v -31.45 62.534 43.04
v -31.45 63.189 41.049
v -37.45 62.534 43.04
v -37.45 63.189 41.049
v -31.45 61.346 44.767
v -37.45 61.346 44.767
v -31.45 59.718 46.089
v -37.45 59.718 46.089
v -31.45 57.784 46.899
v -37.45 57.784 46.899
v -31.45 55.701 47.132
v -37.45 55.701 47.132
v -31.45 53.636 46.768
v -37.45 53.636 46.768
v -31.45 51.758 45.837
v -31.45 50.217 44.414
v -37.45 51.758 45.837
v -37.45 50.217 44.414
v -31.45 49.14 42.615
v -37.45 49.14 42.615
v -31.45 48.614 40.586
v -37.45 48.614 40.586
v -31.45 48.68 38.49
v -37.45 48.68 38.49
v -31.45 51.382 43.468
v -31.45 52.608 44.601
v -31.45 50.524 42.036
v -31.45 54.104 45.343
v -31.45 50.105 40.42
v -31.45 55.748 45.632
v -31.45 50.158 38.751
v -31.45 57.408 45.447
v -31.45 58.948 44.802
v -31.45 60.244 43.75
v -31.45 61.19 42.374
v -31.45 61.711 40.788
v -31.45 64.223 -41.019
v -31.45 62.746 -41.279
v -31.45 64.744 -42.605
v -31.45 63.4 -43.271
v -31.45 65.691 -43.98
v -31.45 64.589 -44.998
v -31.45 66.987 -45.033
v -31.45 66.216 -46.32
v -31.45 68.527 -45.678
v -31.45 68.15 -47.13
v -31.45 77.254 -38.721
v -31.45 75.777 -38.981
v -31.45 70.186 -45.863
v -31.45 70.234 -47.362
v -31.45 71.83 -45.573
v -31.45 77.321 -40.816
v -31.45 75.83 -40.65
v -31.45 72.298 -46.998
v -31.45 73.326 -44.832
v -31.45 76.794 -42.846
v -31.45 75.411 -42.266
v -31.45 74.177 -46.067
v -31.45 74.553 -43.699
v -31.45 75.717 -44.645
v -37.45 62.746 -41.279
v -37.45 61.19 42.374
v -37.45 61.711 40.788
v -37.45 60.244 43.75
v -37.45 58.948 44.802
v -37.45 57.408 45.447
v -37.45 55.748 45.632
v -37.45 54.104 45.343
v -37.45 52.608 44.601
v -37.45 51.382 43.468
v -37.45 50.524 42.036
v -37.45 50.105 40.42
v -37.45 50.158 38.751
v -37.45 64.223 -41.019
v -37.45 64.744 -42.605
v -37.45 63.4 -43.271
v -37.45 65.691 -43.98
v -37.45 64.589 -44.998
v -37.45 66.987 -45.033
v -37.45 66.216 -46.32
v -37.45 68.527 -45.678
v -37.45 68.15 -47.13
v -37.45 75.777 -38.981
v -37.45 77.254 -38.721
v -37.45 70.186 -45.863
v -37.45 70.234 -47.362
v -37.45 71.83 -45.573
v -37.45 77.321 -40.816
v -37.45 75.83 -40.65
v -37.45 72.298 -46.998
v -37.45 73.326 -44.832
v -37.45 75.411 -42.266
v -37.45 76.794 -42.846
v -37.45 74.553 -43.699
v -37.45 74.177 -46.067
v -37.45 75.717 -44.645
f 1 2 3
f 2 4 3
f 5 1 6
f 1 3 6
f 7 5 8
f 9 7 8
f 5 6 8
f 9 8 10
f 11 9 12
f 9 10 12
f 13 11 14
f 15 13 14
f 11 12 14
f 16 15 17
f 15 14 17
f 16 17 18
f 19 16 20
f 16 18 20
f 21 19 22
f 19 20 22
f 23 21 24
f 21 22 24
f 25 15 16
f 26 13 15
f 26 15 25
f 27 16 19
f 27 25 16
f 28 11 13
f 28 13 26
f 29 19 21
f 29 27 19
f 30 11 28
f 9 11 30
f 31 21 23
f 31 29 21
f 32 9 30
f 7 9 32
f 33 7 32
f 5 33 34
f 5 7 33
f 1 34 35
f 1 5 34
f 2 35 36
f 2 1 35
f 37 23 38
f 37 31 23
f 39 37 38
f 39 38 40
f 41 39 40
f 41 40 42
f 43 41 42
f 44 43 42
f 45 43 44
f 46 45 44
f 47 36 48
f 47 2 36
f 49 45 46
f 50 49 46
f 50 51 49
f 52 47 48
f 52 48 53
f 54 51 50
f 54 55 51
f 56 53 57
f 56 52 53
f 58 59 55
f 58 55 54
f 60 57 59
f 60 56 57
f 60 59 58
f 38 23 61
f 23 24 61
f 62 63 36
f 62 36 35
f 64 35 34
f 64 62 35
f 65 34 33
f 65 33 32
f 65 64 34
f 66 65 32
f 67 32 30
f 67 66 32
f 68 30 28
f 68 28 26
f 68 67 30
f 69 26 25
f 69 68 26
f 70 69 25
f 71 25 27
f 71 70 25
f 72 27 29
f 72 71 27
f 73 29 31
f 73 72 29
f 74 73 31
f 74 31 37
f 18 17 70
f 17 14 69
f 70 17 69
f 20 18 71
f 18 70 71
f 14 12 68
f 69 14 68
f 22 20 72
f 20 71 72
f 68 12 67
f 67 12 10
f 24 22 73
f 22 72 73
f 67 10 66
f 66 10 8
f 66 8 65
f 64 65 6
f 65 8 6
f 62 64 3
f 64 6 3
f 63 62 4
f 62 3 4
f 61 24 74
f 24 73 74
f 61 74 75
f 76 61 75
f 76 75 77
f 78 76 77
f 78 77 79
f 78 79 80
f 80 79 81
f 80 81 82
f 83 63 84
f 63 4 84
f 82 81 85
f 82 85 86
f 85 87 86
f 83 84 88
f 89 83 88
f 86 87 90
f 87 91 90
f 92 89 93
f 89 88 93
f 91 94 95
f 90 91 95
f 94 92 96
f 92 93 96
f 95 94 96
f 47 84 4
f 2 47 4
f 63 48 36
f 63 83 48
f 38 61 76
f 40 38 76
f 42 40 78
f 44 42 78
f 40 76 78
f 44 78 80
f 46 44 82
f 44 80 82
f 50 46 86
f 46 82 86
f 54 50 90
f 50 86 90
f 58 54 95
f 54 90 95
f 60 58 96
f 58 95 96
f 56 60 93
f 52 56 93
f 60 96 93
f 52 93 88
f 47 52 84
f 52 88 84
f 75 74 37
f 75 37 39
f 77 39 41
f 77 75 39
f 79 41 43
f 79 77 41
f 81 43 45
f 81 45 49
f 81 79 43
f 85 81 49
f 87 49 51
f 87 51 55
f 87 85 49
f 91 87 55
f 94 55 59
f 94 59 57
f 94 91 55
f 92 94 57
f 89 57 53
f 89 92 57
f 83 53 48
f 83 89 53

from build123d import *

# Parameters (mm, degrees)
BOSS_EXTRUDE1_DEPTH = 3


with BuildPart() as part:
    # Sketch2 → Boss-Extrude1 (new body, symmetric)
    with BuildSketch(Plane.ZY.offset(34.45)):
        with BuildLine():
            Line((-38.720907523, 77.254093909), (41.048520471, 63.188591518))
            ThreePointArc((41.048520471, 63.188591518), (47.023521903, 54.655405132), (38.490335517, 48.6804037))
            Line((38.490335517, 48.6804037), (-41.279092477, 62.745906091))
            ThreePointArc((-41.279092477, 62.745906091), (-47.254093909, 71.279092477), (-38.720907523, 77.254093909))
        make_face()
        with BuildLine():
            Line((-38.98137979, 75.776882279), (40.788048204, 61.711379888))
            ThreePointArc((40.788048204, 61.711379888), (45.546310273, 54.915877399), (38.750807784, 50.15761533))
            Line((38.750807784, 50.15761533), (-41.01862021, 64.223117721))
            ThreePointArc((-41.01862021, 64.223117721), (-45.776882279, 71.01862021), (-38.98137979, 75.776882279))
        make_face(mode=Mode.SUBTRACT)
    extrude(amount=BOSS_EXTRUDE1_DEPTH, both=True)


solid = part.part
